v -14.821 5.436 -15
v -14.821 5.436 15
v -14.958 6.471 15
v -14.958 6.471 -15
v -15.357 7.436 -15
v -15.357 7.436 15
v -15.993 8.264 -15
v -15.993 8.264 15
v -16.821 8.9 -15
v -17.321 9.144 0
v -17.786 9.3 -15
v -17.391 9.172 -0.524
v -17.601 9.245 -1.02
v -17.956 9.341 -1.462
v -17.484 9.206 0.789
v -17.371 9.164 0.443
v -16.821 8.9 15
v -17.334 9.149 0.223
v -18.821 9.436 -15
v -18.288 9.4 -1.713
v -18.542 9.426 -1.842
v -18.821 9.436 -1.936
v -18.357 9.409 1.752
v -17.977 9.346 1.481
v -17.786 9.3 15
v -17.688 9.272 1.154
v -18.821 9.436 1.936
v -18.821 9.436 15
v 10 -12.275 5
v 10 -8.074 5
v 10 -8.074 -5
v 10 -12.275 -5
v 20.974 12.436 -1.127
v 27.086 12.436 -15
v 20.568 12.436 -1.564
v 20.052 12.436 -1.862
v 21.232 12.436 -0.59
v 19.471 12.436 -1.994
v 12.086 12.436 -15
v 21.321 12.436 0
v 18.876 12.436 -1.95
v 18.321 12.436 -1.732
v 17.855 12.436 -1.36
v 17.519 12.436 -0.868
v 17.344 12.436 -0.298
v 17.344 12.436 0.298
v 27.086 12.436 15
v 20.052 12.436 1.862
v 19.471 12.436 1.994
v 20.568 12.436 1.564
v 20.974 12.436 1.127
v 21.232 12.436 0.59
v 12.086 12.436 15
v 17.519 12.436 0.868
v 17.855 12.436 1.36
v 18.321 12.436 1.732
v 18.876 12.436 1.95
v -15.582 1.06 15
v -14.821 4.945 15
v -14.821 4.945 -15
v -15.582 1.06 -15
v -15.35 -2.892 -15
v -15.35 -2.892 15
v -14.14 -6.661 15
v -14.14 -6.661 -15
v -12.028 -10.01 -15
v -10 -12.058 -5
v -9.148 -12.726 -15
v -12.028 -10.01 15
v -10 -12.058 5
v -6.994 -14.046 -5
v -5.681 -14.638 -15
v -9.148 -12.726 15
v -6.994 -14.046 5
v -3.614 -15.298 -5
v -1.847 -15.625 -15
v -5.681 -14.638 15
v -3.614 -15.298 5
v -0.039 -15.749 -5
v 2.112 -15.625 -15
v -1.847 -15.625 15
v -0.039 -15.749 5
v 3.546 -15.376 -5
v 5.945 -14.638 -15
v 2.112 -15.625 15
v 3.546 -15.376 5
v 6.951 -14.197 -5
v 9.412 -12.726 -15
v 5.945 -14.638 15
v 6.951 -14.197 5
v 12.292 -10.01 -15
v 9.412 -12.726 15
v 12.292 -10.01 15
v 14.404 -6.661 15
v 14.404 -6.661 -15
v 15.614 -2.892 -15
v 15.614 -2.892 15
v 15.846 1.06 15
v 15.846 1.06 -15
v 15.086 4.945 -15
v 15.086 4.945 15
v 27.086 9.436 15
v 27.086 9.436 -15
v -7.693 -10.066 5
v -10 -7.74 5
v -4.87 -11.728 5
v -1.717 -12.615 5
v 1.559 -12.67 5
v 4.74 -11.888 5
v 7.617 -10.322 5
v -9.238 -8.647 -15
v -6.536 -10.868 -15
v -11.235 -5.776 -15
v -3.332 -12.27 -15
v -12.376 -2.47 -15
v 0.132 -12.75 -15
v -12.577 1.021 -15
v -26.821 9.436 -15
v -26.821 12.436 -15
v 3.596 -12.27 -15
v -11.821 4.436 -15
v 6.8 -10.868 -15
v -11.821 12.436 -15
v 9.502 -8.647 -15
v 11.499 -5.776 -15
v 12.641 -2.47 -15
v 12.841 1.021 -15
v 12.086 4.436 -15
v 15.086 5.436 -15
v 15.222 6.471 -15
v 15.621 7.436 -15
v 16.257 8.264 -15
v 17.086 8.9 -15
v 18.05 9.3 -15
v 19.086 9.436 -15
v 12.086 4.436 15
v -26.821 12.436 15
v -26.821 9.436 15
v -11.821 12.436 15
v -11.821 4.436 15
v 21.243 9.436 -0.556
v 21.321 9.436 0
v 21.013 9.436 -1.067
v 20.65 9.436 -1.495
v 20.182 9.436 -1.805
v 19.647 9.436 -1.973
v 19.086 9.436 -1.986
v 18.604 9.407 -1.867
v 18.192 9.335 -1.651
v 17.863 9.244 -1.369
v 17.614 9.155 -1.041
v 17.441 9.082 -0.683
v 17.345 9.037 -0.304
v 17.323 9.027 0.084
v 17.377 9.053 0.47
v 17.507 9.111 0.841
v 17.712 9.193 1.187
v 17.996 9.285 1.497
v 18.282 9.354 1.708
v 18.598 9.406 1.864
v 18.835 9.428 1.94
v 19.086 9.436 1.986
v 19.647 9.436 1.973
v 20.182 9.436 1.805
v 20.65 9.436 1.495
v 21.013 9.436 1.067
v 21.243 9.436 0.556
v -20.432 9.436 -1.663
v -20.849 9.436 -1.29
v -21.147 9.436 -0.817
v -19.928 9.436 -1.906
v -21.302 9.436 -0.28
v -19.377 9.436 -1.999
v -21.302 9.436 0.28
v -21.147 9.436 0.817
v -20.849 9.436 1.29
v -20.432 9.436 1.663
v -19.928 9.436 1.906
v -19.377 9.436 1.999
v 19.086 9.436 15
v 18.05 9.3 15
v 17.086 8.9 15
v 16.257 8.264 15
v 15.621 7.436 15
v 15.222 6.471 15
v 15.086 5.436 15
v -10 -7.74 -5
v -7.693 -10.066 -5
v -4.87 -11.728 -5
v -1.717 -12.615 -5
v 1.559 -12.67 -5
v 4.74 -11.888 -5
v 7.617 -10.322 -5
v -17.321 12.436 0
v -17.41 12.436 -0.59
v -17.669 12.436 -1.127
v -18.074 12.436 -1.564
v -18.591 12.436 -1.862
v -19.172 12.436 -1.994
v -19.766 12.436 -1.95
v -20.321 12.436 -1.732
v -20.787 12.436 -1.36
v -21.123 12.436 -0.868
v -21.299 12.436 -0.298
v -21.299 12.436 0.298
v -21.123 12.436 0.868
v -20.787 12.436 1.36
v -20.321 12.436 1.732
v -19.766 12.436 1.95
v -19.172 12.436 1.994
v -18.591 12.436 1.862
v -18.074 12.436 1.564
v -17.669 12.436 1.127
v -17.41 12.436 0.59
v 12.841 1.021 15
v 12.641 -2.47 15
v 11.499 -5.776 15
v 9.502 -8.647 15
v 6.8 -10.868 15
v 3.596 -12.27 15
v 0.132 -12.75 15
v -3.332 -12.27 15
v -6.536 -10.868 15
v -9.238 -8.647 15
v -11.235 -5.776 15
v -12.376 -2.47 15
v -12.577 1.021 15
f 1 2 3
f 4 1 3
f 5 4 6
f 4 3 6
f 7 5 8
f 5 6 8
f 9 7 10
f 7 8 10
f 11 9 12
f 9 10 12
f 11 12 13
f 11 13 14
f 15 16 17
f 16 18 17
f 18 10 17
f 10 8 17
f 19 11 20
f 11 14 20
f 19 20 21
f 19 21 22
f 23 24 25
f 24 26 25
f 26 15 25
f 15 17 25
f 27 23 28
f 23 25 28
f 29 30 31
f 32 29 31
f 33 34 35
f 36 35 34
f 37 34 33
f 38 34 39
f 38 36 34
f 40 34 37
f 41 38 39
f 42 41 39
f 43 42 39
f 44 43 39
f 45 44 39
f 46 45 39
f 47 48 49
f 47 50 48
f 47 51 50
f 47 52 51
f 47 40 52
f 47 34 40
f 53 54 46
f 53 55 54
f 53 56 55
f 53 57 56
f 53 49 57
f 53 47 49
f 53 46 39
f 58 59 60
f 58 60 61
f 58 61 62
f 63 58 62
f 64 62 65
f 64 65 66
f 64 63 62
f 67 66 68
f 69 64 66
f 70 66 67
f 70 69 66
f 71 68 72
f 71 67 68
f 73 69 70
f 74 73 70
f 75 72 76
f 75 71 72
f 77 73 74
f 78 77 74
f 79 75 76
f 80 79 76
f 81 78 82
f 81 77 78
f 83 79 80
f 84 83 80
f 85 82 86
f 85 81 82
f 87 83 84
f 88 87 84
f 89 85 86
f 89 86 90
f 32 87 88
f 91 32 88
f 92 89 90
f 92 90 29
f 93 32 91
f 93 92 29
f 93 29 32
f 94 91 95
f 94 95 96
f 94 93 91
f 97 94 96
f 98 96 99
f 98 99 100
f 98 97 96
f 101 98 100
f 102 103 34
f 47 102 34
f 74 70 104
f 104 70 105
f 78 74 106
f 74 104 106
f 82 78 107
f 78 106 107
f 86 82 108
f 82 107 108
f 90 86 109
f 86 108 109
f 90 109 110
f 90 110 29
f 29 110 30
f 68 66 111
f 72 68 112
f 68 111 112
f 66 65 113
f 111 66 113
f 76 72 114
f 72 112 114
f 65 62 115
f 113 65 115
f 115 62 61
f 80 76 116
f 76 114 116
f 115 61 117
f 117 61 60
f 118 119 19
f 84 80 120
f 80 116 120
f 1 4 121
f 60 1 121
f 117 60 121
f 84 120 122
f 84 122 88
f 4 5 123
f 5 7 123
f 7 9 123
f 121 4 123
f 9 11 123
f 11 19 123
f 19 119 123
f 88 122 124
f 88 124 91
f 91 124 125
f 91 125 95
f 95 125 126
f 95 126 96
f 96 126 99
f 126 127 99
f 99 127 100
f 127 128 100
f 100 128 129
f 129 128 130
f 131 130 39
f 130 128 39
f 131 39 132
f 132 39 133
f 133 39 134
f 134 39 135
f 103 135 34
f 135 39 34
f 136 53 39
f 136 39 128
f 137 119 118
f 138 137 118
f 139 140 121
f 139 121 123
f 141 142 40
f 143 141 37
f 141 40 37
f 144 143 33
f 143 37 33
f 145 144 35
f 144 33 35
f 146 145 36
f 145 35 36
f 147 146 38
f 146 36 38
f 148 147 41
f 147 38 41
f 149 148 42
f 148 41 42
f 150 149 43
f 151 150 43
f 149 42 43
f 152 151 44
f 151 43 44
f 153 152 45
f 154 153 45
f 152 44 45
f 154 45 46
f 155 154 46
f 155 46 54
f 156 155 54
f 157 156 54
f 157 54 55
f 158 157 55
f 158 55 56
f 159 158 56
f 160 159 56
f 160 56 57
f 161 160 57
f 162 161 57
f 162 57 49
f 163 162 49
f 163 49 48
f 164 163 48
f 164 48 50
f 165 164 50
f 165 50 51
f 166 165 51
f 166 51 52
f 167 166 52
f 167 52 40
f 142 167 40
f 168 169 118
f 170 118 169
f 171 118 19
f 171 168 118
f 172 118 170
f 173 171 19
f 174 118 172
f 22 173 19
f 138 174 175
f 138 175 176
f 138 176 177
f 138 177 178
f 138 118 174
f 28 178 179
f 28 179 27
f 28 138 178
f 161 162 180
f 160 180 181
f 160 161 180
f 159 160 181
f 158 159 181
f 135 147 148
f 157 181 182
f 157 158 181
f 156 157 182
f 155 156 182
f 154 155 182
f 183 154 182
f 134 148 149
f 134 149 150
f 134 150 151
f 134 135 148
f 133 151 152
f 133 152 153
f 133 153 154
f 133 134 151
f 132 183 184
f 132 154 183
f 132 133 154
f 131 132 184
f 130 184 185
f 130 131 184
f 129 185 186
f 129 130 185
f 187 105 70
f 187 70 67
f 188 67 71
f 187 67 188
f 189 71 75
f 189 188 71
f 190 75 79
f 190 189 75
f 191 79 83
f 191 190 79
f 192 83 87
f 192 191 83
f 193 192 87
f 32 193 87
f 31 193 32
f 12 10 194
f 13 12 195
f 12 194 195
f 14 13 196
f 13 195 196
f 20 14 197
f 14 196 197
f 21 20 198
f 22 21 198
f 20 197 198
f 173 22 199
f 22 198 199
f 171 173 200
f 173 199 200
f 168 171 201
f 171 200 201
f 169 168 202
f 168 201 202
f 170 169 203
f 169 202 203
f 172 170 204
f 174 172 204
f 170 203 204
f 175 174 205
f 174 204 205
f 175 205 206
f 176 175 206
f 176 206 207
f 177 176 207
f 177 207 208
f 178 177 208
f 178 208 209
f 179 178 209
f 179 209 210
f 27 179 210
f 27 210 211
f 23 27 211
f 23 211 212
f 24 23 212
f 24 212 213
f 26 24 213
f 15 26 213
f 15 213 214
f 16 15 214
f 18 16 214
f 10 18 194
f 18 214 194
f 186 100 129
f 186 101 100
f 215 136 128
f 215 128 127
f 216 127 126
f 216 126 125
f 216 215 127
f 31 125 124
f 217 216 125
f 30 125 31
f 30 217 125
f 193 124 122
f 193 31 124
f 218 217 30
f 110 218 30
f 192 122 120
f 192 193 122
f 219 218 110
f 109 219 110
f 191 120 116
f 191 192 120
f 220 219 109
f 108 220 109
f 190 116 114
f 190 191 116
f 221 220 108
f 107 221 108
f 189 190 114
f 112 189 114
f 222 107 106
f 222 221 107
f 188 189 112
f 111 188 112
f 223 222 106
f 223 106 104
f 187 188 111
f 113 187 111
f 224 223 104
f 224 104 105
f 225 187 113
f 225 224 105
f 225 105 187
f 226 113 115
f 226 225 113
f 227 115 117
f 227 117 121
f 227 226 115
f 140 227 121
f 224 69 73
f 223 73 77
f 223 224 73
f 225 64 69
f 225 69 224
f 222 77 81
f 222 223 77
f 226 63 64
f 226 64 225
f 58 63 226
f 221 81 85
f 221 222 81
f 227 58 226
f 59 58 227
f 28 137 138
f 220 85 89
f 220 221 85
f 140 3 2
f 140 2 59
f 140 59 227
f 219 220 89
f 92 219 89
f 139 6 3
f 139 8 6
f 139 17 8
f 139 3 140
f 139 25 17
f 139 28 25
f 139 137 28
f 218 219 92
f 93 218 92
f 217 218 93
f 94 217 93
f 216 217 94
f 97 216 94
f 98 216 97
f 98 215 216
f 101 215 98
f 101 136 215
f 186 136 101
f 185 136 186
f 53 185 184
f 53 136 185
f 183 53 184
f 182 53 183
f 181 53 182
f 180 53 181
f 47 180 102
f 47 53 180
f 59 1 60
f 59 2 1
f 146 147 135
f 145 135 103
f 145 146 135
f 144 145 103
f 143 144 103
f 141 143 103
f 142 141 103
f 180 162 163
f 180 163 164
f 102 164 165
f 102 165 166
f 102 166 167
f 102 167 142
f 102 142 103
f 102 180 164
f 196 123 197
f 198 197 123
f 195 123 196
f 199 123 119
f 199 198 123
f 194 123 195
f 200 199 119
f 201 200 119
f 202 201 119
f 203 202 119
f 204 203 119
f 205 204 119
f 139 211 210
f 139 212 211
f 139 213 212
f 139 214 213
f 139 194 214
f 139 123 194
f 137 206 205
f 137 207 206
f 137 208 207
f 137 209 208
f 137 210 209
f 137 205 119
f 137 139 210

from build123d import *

# Parameters (mm, degrees)
EXTRUDE_THIN1_DEPTH = 15
FILLET1_R           = 4
SKETCH6_R           = 2
SKETCH6_W           = 20
SKETCH6_H           = 10
CUT_EXTRUDE4_DEPTH  = 29.185938934


with BuildPart() as part:
    # Sketch1 → Extrude-Thin1 (new body, symmetric)
    with BuildSketch(Plane.XY):
        with BuildLine():
            Line((27.085573469, 12.435938934), (12.085573469, 12.435938934))
            Line((12.085573469, 12.435938934), (12.085573469, 4.435938934))
            ThreePointArc((12.085573469, 4.435938934), (0.132124352, -12.75), (-11.821324764, 4.435938934))
            Line((-11.821324764, 4.435938934), (-11.821324764, 12.435938934))
            Line((-11.821324764, 12.435938934), (-26.821324764, 12.435938934))
            Line((-26.821324764, 12.435938934), (-26.821324764, 9.435938934))
            Line((-26.821324764, 9.435938934), (-14.821324764, 9.435938934))
            Line((-14.821324764, 9.435938934), (-14.821324764, 4.945387703))
            ThreePointArc((-14.821324764, 4.945387703), (0.132124352, -15.75), (15.085573469, 4.945387703))
            Line((15.085573469, 4.945387703), (15.085573469, 9.435938934))
            Line((15.085573469, 9.435938934), (27.085573469, 9.435938934))
            Line((27.085573469, 9.435938934), (27.085573469, 12.435938934))
        make_face()
    extrude(amount=EXTRUDE_THIN1_DEPTH, both=True)

    # Fillet1
    fillet1_edges = [part.edges().sort_by_distance(p)[0] for p in [
        (15.085573469, 9.435938934, 0),
        (-14.821324764, 9.435938934, 0),
    ]]
    fillet(fillet1_edges, radius=FILLET1_R)

    # Sketch6 → Cut-Extrude4 (cut, through all)
    with BuildSketch(Plane(origin=(0, 12.435938934, 0), x_dir=(1, 0, 0), z_dir=(0, 1, 0))):
        with Locations((-19.321324764, 0)):
            Circle(SKETCH6_R)
        with Locations((19.321324764, 0)):
            Circle(SKETCH6_R)
        Rectangle(SKETCH6_W, SKETCH6_H)
    extrude(amount=-CUT_EXTRUDE4_DEPTH, mode=Mode.SUBTRACT)


solid = part.part
